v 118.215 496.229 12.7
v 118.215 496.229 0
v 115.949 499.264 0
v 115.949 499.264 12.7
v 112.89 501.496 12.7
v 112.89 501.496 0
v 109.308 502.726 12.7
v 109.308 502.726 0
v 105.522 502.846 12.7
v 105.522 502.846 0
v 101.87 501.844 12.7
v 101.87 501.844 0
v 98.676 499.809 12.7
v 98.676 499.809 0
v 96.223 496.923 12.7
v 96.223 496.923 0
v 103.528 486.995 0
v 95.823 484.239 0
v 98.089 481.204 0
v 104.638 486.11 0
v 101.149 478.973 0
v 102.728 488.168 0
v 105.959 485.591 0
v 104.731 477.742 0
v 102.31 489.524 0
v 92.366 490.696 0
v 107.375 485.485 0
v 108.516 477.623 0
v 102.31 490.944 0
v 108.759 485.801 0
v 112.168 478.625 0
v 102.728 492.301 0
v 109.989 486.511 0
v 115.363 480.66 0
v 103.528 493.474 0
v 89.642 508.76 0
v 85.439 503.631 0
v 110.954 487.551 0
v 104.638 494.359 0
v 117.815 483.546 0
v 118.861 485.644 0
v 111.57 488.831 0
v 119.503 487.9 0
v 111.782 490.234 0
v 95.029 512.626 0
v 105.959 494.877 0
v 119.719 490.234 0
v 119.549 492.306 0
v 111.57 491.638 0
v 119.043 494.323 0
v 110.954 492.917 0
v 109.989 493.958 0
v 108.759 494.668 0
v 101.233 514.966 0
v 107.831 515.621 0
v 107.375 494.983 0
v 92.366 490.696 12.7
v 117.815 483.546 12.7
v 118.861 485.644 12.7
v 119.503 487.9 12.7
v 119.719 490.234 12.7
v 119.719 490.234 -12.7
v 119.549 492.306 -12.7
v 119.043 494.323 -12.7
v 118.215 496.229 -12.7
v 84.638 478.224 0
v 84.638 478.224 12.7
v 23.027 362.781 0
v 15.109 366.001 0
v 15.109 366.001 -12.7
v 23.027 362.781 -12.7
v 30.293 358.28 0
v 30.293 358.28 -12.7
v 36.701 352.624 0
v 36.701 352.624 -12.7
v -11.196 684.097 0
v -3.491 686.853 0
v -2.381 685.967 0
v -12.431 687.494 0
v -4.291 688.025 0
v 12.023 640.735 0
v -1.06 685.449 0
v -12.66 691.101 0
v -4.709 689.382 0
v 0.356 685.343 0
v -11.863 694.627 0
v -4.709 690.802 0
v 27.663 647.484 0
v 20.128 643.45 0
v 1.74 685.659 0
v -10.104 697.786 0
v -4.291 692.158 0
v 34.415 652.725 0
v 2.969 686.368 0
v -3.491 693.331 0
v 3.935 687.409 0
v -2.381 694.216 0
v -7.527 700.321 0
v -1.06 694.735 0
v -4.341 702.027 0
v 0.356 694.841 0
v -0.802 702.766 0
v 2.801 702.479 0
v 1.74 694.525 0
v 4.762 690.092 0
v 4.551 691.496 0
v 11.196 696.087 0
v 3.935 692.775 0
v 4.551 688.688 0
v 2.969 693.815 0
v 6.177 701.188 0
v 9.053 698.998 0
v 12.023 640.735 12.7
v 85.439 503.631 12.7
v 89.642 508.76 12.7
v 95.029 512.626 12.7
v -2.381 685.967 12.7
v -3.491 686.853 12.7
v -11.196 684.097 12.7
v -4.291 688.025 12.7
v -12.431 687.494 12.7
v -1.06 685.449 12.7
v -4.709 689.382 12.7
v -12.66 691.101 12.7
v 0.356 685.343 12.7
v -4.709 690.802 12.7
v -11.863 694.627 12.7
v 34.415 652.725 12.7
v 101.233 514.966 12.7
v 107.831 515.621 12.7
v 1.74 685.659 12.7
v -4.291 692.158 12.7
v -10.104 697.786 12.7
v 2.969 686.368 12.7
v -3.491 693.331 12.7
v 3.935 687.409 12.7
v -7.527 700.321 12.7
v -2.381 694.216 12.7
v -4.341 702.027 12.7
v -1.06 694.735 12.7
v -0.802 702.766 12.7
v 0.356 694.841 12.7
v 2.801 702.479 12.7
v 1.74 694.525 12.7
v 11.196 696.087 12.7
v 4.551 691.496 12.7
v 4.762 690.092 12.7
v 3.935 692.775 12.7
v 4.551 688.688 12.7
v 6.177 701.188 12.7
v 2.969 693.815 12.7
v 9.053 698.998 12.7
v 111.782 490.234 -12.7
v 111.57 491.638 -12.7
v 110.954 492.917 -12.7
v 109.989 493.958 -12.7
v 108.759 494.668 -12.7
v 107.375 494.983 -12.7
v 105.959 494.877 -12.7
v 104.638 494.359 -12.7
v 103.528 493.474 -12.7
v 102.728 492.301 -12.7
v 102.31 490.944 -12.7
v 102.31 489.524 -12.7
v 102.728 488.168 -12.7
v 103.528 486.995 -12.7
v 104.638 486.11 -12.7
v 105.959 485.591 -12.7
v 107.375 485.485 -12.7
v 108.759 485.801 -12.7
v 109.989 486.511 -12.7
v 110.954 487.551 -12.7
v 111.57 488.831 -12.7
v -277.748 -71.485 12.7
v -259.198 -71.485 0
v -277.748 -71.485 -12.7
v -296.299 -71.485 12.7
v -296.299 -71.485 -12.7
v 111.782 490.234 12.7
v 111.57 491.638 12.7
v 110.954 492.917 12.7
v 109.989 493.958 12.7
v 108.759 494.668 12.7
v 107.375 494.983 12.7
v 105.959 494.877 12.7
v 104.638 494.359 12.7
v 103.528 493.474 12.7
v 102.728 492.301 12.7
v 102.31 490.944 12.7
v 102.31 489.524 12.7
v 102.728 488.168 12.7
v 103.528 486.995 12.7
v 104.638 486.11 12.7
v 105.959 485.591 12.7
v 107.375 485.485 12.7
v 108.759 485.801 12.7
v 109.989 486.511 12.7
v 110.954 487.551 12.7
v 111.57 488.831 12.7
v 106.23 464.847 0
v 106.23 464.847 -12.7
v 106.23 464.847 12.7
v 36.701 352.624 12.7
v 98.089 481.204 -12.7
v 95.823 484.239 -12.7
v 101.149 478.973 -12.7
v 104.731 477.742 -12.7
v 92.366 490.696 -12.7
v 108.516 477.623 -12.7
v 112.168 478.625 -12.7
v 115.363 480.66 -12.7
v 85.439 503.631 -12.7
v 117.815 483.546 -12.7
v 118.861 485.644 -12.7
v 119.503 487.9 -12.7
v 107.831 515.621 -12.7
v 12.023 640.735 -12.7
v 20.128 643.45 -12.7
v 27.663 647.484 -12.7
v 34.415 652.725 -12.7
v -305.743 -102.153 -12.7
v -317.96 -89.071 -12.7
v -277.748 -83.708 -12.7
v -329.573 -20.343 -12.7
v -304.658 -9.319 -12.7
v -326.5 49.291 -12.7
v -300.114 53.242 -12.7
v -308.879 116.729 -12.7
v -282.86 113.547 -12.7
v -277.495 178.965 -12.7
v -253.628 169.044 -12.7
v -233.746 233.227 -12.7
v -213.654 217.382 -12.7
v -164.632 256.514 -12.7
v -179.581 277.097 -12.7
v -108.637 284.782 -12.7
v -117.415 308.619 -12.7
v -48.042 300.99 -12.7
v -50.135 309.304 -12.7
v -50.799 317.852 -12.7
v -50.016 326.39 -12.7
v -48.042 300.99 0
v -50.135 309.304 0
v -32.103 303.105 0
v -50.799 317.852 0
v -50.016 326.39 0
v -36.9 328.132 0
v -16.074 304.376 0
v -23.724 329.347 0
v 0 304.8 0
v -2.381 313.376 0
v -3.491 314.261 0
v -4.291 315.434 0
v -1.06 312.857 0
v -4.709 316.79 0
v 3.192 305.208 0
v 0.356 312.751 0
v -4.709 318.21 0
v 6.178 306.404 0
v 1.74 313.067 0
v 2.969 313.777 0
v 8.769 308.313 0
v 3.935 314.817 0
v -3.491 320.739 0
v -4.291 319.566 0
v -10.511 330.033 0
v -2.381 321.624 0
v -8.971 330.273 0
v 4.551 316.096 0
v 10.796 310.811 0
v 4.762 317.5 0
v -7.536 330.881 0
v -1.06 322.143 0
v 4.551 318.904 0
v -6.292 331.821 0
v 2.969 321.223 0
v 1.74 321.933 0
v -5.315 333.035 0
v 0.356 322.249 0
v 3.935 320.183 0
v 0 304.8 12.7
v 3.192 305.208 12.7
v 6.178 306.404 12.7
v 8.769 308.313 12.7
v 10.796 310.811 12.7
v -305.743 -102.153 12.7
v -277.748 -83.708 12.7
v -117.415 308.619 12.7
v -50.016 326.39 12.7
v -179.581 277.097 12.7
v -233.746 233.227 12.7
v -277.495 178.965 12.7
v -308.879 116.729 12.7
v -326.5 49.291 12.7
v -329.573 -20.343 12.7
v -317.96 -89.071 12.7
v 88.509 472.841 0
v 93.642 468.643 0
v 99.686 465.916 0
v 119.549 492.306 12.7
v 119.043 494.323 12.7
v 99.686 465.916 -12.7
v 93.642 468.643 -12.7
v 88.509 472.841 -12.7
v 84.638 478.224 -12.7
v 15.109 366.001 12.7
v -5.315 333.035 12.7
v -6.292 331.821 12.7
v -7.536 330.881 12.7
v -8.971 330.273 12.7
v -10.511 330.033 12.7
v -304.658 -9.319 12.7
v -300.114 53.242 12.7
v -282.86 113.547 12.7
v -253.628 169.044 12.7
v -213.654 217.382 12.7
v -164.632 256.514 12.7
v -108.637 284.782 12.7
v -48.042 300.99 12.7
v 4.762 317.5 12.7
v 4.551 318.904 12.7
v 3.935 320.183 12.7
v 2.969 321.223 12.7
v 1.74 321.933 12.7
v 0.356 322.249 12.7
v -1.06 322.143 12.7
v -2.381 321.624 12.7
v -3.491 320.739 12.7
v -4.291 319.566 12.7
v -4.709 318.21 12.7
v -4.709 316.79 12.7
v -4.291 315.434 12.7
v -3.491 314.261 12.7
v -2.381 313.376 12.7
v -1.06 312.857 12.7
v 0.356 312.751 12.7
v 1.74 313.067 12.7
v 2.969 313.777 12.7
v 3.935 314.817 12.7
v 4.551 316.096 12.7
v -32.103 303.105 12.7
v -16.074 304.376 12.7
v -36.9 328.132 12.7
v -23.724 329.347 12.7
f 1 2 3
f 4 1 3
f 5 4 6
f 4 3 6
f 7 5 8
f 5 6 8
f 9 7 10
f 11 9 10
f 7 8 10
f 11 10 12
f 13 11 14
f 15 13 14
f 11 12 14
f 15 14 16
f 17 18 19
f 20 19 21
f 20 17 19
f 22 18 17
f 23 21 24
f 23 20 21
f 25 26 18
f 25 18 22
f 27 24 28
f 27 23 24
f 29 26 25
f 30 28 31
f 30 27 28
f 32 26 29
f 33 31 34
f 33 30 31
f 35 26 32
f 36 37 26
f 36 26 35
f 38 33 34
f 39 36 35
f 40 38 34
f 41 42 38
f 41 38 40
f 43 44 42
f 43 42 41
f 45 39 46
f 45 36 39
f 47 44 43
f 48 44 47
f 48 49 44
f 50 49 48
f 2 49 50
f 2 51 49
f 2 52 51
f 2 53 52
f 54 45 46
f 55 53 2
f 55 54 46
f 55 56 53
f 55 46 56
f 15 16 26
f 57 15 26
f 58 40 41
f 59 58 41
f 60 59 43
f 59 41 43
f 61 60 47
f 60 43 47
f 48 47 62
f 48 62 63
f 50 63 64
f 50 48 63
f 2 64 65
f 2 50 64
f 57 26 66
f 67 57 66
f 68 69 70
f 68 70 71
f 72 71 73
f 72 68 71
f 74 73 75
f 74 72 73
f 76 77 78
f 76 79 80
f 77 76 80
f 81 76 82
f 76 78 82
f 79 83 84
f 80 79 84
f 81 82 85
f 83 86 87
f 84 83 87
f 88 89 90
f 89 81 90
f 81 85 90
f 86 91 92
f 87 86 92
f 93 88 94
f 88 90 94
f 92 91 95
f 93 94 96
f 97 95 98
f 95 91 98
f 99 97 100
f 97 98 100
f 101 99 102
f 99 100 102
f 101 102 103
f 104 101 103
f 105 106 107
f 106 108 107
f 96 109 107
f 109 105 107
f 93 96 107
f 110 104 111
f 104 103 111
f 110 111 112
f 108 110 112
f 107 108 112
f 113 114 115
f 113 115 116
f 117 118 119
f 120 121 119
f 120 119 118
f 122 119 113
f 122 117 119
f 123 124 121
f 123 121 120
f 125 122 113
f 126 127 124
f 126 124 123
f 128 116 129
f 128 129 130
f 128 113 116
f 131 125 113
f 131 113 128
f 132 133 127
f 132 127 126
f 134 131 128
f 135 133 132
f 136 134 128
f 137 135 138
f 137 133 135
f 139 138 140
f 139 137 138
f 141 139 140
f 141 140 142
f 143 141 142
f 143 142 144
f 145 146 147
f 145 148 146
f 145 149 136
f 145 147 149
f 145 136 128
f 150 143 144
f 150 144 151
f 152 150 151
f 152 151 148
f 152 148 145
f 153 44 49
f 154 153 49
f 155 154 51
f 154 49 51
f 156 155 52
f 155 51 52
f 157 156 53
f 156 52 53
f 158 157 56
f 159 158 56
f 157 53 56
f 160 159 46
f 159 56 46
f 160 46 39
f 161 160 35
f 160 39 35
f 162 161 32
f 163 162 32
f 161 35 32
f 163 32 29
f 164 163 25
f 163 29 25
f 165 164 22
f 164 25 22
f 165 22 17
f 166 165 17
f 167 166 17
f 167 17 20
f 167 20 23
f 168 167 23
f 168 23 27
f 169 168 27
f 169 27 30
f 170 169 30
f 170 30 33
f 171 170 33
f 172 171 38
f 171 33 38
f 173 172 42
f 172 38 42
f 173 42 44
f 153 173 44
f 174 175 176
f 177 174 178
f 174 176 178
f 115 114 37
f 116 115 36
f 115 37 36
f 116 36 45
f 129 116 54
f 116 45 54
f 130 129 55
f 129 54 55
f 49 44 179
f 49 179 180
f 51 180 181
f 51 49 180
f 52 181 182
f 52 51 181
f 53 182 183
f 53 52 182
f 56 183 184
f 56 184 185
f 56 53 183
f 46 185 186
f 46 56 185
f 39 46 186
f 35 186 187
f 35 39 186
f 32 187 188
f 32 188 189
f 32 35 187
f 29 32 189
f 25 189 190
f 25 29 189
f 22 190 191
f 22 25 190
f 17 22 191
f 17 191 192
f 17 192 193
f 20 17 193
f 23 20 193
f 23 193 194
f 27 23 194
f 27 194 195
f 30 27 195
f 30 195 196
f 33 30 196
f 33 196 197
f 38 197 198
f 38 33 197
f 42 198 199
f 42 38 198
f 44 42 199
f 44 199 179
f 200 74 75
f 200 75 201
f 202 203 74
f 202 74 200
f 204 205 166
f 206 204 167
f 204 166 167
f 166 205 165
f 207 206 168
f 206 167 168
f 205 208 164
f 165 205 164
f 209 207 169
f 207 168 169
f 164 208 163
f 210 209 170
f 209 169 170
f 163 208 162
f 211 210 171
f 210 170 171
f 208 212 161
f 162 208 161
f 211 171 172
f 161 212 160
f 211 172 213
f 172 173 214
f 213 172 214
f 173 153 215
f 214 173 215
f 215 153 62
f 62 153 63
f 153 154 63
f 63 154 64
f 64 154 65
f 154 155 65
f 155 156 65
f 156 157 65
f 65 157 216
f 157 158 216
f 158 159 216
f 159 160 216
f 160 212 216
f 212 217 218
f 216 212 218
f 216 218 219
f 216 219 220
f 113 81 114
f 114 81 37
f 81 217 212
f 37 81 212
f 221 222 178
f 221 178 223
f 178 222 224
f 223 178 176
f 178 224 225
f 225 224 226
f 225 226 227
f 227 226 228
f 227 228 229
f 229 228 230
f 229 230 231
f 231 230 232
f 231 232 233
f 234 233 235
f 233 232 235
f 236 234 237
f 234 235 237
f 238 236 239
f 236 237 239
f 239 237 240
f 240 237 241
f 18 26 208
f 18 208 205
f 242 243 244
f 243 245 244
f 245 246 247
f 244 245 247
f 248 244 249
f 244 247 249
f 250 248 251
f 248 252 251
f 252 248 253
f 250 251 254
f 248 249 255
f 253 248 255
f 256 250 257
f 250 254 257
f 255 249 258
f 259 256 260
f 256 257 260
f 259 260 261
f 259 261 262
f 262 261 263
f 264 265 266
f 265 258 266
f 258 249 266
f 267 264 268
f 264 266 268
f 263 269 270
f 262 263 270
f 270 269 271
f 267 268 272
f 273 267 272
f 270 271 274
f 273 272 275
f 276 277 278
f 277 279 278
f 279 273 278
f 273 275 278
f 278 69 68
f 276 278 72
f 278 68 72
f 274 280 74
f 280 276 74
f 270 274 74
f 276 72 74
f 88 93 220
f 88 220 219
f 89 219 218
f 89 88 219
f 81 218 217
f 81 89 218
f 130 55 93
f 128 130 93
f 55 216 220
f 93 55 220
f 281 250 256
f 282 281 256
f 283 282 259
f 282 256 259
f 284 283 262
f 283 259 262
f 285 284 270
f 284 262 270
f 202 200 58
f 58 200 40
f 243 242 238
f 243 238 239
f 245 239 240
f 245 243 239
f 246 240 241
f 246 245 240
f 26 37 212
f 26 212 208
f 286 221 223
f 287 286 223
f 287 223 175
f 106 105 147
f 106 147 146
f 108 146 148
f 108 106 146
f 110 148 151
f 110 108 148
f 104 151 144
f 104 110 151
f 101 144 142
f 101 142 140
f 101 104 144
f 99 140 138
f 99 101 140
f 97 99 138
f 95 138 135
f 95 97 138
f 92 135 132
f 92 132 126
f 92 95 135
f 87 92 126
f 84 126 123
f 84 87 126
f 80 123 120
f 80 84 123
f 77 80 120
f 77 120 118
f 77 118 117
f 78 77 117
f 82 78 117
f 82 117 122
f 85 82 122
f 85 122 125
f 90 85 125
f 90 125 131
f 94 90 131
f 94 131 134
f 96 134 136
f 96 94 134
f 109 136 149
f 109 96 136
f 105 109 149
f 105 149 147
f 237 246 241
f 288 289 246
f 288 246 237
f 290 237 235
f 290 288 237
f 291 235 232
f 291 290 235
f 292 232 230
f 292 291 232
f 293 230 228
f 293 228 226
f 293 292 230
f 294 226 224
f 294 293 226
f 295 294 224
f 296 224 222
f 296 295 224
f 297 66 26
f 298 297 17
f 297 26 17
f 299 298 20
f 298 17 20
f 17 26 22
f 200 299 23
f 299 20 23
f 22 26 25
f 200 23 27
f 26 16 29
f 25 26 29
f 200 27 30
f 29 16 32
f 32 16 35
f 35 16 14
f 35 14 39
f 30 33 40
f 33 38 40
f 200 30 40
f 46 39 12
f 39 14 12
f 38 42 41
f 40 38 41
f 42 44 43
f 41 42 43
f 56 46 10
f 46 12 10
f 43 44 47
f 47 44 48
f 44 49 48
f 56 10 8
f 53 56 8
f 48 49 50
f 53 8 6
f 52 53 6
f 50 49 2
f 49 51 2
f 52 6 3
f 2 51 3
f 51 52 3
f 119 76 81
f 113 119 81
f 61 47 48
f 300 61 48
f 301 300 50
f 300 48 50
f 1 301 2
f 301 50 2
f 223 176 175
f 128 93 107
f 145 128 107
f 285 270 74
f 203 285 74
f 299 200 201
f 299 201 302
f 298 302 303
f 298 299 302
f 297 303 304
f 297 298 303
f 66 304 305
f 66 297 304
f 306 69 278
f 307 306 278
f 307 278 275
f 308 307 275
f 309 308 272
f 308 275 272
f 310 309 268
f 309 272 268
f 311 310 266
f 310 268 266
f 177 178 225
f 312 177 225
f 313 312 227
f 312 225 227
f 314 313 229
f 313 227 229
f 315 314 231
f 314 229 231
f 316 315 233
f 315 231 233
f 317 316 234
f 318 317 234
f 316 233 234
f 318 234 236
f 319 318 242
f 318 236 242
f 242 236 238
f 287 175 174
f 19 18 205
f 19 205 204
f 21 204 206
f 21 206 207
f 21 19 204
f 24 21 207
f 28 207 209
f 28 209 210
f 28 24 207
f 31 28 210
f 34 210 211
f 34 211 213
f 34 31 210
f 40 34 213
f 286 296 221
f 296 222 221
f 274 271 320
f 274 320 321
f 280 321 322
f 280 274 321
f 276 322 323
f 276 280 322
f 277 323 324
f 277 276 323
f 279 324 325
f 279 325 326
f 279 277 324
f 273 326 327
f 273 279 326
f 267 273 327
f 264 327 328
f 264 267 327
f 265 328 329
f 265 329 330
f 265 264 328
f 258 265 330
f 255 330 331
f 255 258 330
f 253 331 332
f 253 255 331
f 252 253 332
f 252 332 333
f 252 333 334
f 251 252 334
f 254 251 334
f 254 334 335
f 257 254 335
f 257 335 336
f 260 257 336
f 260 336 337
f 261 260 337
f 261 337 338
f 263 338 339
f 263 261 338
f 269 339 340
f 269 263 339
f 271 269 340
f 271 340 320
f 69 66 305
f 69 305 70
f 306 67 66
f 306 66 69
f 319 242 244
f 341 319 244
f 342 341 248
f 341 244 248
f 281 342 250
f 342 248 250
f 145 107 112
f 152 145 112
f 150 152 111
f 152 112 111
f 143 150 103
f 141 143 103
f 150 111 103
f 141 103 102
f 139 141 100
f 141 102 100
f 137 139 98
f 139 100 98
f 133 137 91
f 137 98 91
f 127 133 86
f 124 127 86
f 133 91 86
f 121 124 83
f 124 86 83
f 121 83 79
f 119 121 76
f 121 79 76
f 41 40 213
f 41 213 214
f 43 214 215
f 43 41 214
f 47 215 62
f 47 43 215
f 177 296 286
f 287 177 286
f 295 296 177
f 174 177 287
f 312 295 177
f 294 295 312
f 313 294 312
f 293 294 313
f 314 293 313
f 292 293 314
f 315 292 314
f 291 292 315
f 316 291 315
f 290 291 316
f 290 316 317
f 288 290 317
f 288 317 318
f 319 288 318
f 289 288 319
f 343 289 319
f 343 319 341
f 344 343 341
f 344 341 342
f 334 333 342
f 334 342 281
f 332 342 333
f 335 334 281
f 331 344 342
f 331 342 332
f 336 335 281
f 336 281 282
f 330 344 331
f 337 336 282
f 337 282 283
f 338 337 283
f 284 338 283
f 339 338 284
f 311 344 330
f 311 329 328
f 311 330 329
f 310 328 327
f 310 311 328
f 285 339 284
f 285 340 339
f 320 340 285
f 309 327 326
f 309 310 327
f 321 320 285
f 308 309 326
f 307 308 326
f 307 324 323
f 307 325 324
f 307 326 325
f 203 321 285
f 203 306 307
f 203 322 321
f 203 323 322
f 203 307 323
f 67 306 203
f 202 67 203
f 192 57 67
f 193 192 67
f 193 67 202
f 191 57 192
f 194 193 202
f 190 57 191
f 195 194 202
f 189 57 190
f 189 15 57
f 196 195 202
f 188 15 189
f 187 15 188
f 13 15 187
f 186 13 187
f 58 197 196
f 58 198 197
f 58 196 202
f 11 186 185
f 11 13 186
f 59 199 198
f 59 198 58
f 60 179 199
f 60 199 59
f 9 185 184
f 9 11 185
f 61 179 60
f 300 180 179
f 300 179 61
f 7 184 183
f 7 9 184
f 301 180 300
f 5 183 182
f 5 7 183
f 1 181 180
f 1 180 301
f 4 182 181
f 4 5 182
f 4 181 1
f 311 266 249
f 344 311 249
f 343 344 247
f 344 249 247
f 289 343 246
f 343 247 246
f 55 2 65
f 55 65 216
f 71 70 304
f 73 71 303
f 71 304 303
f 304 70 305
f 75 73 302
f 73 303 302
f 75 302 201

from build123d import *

# Parameters (mm, degrees)
F0_R     = 4.7625
F1_DEPTH = 12.7
F2_DEPTH = 12.7
F3_DEPTH = 12.7
F4_DEPTH = 12.7
F6_DEPTH = 30.669547


with BuildPart() as f1:
    # F0 (on Top) → F1 (new body)
    with BuildSketch(Plane.XY):
        with BuildLine():
            ThreePointArc((15.109319, 366.001015), (26.754789, 360.683576), (36.701107, 352.623621))
            Line((36.701107, 352.623621), (106.229886, 464.846572))
            ThreePointArc((106.229886, 464.846572), (93.641761, 468.642518), (84.638098, 478.223966))
            Line((84.638098, 478.223966), (15.109319, 366.001015))
        make_face()
        with BuildLine():
            ThreePointArc((84.638098, 478.223966), (93.641761, 468.642518), (106.229886, 464.846572))
            Line((106.229886, 464.846572), (117.815049, 483.545609))
            ThreePointArc((117.815049, 483.545609), (106.618838, 477.540617), (95.823255, 484.239157))
            Line((95.823255, 484.239157), (92.365531, 490.696432))
            Line((92.365531, 490.696432), (84.638098, 478.223966))
        make_face()
        with BuildLine():
            ThreePointArc((95.823255, 484.239157), (106.618838, 477.540617), (117.815049, 483.545609))
            ThreePointArc((117.815049, 483.545609), (119.233856, 486.757084), (119.719155, 490.234306))
            ThreePointArc((119.719155, 490.234306), (119.337392, 493.32478), (118.215055, 496.229455))
            ThreePointArc((118.215055, 496.229455), (107.419472, 502.927995), (96.223261, 496.923003))
            ThreePointArc((96.223261, 496.923003), (94.325466, 490.634623), (95.823255, 484.239157))
        make_face()
        with Locations((107.019155, 490.234306)):
            Circle(F0_R, mode=Mode.SUBTRACT)
        with BuildLine():
            Line((92.365531, 490.696432), (95.823255, 484.239157))
            ThreePointArc((95.823255, 484.239157), (94.325466, 490.634623), (96.223261, 496.923003))
            Line((96.223261, 496.923003), (92.365531, 490.696432))
        make_face()
        with BuildLine():
            ThreePointArc((-50.016076, 326.39), (-50.647309, 313.564257), (-48.042272, 300.99))
            ThreePointArc((-48.042272, 300.99), (-24.096556, 303.846007), (0, 304.8))
            ThreePointArc((0, 304.8), (6.178331, 306.404135), (10.795894, 310.811303))
            Line((10.795894, 310.811303), (36.701107, 352.623621))
            ThreePointArc((36.701107, 352.623621), (26.754789, 360.683576), (15.109319, 366.001015))
            Line((15.109319, 366.001015), (-5.315021, 333.035102))
            ThreePointArc((-5.315021, 333.035102), (-7.535883, 330.881394), (-10.510837, 330.032669))
            ThreePointArc((-10.510837, 330.032669), (-30.318213, 328.805179), (-50.016076, 326.39))
        make_face()
        with Locations((0, 317.5)):
            Circle(F0_R, mode=Mode.SUBTRACT)
        with BuildLine():
            Line((-259.19804, -71.48465), (-296.29881, -71.48465))
            ThreePointArc((-296.29881, -71.48465), (-253.627752, 169.044383), (-48.042272, 300.99))
            ThreePointArc((-48.042272, 300.99), (-50.647309, 313.564257), (-50.016076, 326.39))
            ThreePointArc((-50.016076, 326.39), (-277.494981, 178.965292), (-317.959825, -89.070699))
            Line((-317.959825, -89.070699), (-305.742532, -102.153197))
            Line((-305.742532, -102.153197), (-259.19804, -71.48465))
        make_face()
    extrude(amount=F1_DEPTH)

    # F0 (on Top) → F2 (join)
    with BuildSketch(Plane.XY):
        with BuildLine():
            ThreePointArc((15.109319, 366.001015), (26.754789, 360.683576), (36.701107, 352.623621))
            Line((36.701107, 352.623621), (106.229886, 464.846572))
            ThreePointArc((106.229886, 464.846572), (93.641761, 468.642518), (84.638098, 478.223966))
            Line((84.638098, 478.223966), (15.109319, 366.001015))
        make_face()
        with BuildLine():
            Line((-259.19804, -71.48465), (-296.29881, -71.48465))
            ThreePointArc((-296.29881, -71.48465), (-253.627752, 169.044383), (-48.042272, 300.99))
            ThreePointArc((-48.042272, 300.99), (-50.647309, 313.564257), (-50.016076, 326.39))
            ThreePointArc((-50.016076, 326.39), (-277.494981, 178.965292), (-317.959825, -89.070699))
            Line((-317.959825, -89.070699), (-305.742532, -102.153197))
            Line((-305.742532, -102.153197), (-259.19804, -71.48465))
        make_face()
    extrude(amount=-F2_DEPTH)

    # F5 (on face) → F6 (cut, through all)
    with BuildSketch(Plane(origin=(0, -71.48465, 0), x_dir=(-1, 0, 0), z_dir=(0, 1, 0))):
        Polygon((259.19804, 12.7), (259.19804, 0), (277.748425, 12.7), align=None)
        Polygon((277.748425, -12.7), (259.19804, 0), (259.19804, -12.7), align=None)
    extrude(amount=-F6_DEPTH, mode=Mode.SUBTRACT)


with BuildPart() as f3:
    # F0 (on Top) → F3 (new body)
    with BuildSketch(Plane.XY):
        with BuildLine():
            Line((12.023213, 640.735163), (85.439352, 503.631025))
            ThreePointArc((85.439352, 503.631025), (95.028856, 512.626107), (107.831152, 515.621324))
            Line((107.831152, 515.621324), (34.415014, 652.725462))
            ThreePointArc((34.415014, 652.725462), (23.980597, 645.308247), (12.023213, 640.735163))
        make_face()
        with BuildLine():
            Line((85.439352, 503.631025), (92.365531, 490.696432))
            Line((92.365531, 490.696432), (96.223261, 496.923003))
            ThreePointArc((96.223261, 496.923003), (107.419472, 502.927995), (118.215055, 496.229455))
            Line((118.215055, 496.229455), (107.831152, 515.621324))
            ThreePointArc((107.831152, 515.621324), (95.028856, 512.626107), (85.439352, 503.631025))
        make_face()
        with BuildLine():
            Line((92.365531, 490.696432), (95.823255, 484.239157))
            ThreePointArc((95.823255, 484.239157), (94.325466, 490.634623), (96.223261, 496.923003))
            Line((96.223261, 496.923003), (92.365531, 490.696432))
        make_face()
        with BuildLine():
            ThreePointArc((95.823255, 484.239157), (106.618838, 477.540617), (117.815049, 483.545609))
            ThreePointArc((117.815049, 483.545609), (119.233856, 486.757084), (119.719155, 490.234306))
            ThreePointArc((119.719155, 490.234306), (119.337392, 493.32478), (118.215055, 496.229455))
            ThreePointArc((118.215055, 496.229455), (107.419472, 502.927995), (96.223261, 496.923003))
            ThreePointArc((96.223261, 496.923003), (94.325466, 490.634623), (95.823255, 484.239157))
        make_face()
        with Locations((107.019155, 490.234306)):
            Circle(F0_R, mode=Mode.SUBTRACT)
    extrude(amount=-F3_DEPTH)

    # F0 (on Top) → F4 (join)
    with BuildSketch(Plane.XY):
        with BuildLine():
            Line((12.023213, 640.735163), (85.439352, 503.631025))
            ThreePointArc((85.439352, 503.631025), (95.028856, 512.626107), (107.831152, 515.621324))
            Line((107.831152, 515.621324), (34.415014, 652.725462))
            ThreePointArc((34.415014, 652.725462), (23.980597, 645.308247), (12.023213, 640.735163))
        make_face()
        with BuildLine():
            Line((-11.1959, 684.096699), (12.023213, 640.735163))
            ThreePointArc((12.023213, 640.735163), (23.980597, 645.308247), (34.415014, 652.725462))
            Line((34.415014, 652.725462), (11.1959, 696.086998))
            ThreePointArc((11.1959, 696.086998), (12.318237, 693.182323), (12.7, 690.091848))
            ThreePointArc((12.7, 690.091848), (3.090474, 677.773611), (-11.1959, 684.096699))
        make_face()
        with BuildLine():
            ThreePointArc((11.1959, 696.086998), (-5.995149, 701.287749), (-11.1959, 684.096699))
            ThreePointArc((-11.1959, 684.096699), (3.090474, 677.773611), (12.7, 690.091848))
            ThreePointArc((12.7, 690.091848), (12.318237, 693.182323), (11.1959, 696.086998))
        make_face()
        with Locations((0, 690.091848)):
            Circle(F0_R, mode=Mode.SUBTRACT)
    extrude(amount=F4_DEPTH)


solid = Compound([f1.part, f3.part])
